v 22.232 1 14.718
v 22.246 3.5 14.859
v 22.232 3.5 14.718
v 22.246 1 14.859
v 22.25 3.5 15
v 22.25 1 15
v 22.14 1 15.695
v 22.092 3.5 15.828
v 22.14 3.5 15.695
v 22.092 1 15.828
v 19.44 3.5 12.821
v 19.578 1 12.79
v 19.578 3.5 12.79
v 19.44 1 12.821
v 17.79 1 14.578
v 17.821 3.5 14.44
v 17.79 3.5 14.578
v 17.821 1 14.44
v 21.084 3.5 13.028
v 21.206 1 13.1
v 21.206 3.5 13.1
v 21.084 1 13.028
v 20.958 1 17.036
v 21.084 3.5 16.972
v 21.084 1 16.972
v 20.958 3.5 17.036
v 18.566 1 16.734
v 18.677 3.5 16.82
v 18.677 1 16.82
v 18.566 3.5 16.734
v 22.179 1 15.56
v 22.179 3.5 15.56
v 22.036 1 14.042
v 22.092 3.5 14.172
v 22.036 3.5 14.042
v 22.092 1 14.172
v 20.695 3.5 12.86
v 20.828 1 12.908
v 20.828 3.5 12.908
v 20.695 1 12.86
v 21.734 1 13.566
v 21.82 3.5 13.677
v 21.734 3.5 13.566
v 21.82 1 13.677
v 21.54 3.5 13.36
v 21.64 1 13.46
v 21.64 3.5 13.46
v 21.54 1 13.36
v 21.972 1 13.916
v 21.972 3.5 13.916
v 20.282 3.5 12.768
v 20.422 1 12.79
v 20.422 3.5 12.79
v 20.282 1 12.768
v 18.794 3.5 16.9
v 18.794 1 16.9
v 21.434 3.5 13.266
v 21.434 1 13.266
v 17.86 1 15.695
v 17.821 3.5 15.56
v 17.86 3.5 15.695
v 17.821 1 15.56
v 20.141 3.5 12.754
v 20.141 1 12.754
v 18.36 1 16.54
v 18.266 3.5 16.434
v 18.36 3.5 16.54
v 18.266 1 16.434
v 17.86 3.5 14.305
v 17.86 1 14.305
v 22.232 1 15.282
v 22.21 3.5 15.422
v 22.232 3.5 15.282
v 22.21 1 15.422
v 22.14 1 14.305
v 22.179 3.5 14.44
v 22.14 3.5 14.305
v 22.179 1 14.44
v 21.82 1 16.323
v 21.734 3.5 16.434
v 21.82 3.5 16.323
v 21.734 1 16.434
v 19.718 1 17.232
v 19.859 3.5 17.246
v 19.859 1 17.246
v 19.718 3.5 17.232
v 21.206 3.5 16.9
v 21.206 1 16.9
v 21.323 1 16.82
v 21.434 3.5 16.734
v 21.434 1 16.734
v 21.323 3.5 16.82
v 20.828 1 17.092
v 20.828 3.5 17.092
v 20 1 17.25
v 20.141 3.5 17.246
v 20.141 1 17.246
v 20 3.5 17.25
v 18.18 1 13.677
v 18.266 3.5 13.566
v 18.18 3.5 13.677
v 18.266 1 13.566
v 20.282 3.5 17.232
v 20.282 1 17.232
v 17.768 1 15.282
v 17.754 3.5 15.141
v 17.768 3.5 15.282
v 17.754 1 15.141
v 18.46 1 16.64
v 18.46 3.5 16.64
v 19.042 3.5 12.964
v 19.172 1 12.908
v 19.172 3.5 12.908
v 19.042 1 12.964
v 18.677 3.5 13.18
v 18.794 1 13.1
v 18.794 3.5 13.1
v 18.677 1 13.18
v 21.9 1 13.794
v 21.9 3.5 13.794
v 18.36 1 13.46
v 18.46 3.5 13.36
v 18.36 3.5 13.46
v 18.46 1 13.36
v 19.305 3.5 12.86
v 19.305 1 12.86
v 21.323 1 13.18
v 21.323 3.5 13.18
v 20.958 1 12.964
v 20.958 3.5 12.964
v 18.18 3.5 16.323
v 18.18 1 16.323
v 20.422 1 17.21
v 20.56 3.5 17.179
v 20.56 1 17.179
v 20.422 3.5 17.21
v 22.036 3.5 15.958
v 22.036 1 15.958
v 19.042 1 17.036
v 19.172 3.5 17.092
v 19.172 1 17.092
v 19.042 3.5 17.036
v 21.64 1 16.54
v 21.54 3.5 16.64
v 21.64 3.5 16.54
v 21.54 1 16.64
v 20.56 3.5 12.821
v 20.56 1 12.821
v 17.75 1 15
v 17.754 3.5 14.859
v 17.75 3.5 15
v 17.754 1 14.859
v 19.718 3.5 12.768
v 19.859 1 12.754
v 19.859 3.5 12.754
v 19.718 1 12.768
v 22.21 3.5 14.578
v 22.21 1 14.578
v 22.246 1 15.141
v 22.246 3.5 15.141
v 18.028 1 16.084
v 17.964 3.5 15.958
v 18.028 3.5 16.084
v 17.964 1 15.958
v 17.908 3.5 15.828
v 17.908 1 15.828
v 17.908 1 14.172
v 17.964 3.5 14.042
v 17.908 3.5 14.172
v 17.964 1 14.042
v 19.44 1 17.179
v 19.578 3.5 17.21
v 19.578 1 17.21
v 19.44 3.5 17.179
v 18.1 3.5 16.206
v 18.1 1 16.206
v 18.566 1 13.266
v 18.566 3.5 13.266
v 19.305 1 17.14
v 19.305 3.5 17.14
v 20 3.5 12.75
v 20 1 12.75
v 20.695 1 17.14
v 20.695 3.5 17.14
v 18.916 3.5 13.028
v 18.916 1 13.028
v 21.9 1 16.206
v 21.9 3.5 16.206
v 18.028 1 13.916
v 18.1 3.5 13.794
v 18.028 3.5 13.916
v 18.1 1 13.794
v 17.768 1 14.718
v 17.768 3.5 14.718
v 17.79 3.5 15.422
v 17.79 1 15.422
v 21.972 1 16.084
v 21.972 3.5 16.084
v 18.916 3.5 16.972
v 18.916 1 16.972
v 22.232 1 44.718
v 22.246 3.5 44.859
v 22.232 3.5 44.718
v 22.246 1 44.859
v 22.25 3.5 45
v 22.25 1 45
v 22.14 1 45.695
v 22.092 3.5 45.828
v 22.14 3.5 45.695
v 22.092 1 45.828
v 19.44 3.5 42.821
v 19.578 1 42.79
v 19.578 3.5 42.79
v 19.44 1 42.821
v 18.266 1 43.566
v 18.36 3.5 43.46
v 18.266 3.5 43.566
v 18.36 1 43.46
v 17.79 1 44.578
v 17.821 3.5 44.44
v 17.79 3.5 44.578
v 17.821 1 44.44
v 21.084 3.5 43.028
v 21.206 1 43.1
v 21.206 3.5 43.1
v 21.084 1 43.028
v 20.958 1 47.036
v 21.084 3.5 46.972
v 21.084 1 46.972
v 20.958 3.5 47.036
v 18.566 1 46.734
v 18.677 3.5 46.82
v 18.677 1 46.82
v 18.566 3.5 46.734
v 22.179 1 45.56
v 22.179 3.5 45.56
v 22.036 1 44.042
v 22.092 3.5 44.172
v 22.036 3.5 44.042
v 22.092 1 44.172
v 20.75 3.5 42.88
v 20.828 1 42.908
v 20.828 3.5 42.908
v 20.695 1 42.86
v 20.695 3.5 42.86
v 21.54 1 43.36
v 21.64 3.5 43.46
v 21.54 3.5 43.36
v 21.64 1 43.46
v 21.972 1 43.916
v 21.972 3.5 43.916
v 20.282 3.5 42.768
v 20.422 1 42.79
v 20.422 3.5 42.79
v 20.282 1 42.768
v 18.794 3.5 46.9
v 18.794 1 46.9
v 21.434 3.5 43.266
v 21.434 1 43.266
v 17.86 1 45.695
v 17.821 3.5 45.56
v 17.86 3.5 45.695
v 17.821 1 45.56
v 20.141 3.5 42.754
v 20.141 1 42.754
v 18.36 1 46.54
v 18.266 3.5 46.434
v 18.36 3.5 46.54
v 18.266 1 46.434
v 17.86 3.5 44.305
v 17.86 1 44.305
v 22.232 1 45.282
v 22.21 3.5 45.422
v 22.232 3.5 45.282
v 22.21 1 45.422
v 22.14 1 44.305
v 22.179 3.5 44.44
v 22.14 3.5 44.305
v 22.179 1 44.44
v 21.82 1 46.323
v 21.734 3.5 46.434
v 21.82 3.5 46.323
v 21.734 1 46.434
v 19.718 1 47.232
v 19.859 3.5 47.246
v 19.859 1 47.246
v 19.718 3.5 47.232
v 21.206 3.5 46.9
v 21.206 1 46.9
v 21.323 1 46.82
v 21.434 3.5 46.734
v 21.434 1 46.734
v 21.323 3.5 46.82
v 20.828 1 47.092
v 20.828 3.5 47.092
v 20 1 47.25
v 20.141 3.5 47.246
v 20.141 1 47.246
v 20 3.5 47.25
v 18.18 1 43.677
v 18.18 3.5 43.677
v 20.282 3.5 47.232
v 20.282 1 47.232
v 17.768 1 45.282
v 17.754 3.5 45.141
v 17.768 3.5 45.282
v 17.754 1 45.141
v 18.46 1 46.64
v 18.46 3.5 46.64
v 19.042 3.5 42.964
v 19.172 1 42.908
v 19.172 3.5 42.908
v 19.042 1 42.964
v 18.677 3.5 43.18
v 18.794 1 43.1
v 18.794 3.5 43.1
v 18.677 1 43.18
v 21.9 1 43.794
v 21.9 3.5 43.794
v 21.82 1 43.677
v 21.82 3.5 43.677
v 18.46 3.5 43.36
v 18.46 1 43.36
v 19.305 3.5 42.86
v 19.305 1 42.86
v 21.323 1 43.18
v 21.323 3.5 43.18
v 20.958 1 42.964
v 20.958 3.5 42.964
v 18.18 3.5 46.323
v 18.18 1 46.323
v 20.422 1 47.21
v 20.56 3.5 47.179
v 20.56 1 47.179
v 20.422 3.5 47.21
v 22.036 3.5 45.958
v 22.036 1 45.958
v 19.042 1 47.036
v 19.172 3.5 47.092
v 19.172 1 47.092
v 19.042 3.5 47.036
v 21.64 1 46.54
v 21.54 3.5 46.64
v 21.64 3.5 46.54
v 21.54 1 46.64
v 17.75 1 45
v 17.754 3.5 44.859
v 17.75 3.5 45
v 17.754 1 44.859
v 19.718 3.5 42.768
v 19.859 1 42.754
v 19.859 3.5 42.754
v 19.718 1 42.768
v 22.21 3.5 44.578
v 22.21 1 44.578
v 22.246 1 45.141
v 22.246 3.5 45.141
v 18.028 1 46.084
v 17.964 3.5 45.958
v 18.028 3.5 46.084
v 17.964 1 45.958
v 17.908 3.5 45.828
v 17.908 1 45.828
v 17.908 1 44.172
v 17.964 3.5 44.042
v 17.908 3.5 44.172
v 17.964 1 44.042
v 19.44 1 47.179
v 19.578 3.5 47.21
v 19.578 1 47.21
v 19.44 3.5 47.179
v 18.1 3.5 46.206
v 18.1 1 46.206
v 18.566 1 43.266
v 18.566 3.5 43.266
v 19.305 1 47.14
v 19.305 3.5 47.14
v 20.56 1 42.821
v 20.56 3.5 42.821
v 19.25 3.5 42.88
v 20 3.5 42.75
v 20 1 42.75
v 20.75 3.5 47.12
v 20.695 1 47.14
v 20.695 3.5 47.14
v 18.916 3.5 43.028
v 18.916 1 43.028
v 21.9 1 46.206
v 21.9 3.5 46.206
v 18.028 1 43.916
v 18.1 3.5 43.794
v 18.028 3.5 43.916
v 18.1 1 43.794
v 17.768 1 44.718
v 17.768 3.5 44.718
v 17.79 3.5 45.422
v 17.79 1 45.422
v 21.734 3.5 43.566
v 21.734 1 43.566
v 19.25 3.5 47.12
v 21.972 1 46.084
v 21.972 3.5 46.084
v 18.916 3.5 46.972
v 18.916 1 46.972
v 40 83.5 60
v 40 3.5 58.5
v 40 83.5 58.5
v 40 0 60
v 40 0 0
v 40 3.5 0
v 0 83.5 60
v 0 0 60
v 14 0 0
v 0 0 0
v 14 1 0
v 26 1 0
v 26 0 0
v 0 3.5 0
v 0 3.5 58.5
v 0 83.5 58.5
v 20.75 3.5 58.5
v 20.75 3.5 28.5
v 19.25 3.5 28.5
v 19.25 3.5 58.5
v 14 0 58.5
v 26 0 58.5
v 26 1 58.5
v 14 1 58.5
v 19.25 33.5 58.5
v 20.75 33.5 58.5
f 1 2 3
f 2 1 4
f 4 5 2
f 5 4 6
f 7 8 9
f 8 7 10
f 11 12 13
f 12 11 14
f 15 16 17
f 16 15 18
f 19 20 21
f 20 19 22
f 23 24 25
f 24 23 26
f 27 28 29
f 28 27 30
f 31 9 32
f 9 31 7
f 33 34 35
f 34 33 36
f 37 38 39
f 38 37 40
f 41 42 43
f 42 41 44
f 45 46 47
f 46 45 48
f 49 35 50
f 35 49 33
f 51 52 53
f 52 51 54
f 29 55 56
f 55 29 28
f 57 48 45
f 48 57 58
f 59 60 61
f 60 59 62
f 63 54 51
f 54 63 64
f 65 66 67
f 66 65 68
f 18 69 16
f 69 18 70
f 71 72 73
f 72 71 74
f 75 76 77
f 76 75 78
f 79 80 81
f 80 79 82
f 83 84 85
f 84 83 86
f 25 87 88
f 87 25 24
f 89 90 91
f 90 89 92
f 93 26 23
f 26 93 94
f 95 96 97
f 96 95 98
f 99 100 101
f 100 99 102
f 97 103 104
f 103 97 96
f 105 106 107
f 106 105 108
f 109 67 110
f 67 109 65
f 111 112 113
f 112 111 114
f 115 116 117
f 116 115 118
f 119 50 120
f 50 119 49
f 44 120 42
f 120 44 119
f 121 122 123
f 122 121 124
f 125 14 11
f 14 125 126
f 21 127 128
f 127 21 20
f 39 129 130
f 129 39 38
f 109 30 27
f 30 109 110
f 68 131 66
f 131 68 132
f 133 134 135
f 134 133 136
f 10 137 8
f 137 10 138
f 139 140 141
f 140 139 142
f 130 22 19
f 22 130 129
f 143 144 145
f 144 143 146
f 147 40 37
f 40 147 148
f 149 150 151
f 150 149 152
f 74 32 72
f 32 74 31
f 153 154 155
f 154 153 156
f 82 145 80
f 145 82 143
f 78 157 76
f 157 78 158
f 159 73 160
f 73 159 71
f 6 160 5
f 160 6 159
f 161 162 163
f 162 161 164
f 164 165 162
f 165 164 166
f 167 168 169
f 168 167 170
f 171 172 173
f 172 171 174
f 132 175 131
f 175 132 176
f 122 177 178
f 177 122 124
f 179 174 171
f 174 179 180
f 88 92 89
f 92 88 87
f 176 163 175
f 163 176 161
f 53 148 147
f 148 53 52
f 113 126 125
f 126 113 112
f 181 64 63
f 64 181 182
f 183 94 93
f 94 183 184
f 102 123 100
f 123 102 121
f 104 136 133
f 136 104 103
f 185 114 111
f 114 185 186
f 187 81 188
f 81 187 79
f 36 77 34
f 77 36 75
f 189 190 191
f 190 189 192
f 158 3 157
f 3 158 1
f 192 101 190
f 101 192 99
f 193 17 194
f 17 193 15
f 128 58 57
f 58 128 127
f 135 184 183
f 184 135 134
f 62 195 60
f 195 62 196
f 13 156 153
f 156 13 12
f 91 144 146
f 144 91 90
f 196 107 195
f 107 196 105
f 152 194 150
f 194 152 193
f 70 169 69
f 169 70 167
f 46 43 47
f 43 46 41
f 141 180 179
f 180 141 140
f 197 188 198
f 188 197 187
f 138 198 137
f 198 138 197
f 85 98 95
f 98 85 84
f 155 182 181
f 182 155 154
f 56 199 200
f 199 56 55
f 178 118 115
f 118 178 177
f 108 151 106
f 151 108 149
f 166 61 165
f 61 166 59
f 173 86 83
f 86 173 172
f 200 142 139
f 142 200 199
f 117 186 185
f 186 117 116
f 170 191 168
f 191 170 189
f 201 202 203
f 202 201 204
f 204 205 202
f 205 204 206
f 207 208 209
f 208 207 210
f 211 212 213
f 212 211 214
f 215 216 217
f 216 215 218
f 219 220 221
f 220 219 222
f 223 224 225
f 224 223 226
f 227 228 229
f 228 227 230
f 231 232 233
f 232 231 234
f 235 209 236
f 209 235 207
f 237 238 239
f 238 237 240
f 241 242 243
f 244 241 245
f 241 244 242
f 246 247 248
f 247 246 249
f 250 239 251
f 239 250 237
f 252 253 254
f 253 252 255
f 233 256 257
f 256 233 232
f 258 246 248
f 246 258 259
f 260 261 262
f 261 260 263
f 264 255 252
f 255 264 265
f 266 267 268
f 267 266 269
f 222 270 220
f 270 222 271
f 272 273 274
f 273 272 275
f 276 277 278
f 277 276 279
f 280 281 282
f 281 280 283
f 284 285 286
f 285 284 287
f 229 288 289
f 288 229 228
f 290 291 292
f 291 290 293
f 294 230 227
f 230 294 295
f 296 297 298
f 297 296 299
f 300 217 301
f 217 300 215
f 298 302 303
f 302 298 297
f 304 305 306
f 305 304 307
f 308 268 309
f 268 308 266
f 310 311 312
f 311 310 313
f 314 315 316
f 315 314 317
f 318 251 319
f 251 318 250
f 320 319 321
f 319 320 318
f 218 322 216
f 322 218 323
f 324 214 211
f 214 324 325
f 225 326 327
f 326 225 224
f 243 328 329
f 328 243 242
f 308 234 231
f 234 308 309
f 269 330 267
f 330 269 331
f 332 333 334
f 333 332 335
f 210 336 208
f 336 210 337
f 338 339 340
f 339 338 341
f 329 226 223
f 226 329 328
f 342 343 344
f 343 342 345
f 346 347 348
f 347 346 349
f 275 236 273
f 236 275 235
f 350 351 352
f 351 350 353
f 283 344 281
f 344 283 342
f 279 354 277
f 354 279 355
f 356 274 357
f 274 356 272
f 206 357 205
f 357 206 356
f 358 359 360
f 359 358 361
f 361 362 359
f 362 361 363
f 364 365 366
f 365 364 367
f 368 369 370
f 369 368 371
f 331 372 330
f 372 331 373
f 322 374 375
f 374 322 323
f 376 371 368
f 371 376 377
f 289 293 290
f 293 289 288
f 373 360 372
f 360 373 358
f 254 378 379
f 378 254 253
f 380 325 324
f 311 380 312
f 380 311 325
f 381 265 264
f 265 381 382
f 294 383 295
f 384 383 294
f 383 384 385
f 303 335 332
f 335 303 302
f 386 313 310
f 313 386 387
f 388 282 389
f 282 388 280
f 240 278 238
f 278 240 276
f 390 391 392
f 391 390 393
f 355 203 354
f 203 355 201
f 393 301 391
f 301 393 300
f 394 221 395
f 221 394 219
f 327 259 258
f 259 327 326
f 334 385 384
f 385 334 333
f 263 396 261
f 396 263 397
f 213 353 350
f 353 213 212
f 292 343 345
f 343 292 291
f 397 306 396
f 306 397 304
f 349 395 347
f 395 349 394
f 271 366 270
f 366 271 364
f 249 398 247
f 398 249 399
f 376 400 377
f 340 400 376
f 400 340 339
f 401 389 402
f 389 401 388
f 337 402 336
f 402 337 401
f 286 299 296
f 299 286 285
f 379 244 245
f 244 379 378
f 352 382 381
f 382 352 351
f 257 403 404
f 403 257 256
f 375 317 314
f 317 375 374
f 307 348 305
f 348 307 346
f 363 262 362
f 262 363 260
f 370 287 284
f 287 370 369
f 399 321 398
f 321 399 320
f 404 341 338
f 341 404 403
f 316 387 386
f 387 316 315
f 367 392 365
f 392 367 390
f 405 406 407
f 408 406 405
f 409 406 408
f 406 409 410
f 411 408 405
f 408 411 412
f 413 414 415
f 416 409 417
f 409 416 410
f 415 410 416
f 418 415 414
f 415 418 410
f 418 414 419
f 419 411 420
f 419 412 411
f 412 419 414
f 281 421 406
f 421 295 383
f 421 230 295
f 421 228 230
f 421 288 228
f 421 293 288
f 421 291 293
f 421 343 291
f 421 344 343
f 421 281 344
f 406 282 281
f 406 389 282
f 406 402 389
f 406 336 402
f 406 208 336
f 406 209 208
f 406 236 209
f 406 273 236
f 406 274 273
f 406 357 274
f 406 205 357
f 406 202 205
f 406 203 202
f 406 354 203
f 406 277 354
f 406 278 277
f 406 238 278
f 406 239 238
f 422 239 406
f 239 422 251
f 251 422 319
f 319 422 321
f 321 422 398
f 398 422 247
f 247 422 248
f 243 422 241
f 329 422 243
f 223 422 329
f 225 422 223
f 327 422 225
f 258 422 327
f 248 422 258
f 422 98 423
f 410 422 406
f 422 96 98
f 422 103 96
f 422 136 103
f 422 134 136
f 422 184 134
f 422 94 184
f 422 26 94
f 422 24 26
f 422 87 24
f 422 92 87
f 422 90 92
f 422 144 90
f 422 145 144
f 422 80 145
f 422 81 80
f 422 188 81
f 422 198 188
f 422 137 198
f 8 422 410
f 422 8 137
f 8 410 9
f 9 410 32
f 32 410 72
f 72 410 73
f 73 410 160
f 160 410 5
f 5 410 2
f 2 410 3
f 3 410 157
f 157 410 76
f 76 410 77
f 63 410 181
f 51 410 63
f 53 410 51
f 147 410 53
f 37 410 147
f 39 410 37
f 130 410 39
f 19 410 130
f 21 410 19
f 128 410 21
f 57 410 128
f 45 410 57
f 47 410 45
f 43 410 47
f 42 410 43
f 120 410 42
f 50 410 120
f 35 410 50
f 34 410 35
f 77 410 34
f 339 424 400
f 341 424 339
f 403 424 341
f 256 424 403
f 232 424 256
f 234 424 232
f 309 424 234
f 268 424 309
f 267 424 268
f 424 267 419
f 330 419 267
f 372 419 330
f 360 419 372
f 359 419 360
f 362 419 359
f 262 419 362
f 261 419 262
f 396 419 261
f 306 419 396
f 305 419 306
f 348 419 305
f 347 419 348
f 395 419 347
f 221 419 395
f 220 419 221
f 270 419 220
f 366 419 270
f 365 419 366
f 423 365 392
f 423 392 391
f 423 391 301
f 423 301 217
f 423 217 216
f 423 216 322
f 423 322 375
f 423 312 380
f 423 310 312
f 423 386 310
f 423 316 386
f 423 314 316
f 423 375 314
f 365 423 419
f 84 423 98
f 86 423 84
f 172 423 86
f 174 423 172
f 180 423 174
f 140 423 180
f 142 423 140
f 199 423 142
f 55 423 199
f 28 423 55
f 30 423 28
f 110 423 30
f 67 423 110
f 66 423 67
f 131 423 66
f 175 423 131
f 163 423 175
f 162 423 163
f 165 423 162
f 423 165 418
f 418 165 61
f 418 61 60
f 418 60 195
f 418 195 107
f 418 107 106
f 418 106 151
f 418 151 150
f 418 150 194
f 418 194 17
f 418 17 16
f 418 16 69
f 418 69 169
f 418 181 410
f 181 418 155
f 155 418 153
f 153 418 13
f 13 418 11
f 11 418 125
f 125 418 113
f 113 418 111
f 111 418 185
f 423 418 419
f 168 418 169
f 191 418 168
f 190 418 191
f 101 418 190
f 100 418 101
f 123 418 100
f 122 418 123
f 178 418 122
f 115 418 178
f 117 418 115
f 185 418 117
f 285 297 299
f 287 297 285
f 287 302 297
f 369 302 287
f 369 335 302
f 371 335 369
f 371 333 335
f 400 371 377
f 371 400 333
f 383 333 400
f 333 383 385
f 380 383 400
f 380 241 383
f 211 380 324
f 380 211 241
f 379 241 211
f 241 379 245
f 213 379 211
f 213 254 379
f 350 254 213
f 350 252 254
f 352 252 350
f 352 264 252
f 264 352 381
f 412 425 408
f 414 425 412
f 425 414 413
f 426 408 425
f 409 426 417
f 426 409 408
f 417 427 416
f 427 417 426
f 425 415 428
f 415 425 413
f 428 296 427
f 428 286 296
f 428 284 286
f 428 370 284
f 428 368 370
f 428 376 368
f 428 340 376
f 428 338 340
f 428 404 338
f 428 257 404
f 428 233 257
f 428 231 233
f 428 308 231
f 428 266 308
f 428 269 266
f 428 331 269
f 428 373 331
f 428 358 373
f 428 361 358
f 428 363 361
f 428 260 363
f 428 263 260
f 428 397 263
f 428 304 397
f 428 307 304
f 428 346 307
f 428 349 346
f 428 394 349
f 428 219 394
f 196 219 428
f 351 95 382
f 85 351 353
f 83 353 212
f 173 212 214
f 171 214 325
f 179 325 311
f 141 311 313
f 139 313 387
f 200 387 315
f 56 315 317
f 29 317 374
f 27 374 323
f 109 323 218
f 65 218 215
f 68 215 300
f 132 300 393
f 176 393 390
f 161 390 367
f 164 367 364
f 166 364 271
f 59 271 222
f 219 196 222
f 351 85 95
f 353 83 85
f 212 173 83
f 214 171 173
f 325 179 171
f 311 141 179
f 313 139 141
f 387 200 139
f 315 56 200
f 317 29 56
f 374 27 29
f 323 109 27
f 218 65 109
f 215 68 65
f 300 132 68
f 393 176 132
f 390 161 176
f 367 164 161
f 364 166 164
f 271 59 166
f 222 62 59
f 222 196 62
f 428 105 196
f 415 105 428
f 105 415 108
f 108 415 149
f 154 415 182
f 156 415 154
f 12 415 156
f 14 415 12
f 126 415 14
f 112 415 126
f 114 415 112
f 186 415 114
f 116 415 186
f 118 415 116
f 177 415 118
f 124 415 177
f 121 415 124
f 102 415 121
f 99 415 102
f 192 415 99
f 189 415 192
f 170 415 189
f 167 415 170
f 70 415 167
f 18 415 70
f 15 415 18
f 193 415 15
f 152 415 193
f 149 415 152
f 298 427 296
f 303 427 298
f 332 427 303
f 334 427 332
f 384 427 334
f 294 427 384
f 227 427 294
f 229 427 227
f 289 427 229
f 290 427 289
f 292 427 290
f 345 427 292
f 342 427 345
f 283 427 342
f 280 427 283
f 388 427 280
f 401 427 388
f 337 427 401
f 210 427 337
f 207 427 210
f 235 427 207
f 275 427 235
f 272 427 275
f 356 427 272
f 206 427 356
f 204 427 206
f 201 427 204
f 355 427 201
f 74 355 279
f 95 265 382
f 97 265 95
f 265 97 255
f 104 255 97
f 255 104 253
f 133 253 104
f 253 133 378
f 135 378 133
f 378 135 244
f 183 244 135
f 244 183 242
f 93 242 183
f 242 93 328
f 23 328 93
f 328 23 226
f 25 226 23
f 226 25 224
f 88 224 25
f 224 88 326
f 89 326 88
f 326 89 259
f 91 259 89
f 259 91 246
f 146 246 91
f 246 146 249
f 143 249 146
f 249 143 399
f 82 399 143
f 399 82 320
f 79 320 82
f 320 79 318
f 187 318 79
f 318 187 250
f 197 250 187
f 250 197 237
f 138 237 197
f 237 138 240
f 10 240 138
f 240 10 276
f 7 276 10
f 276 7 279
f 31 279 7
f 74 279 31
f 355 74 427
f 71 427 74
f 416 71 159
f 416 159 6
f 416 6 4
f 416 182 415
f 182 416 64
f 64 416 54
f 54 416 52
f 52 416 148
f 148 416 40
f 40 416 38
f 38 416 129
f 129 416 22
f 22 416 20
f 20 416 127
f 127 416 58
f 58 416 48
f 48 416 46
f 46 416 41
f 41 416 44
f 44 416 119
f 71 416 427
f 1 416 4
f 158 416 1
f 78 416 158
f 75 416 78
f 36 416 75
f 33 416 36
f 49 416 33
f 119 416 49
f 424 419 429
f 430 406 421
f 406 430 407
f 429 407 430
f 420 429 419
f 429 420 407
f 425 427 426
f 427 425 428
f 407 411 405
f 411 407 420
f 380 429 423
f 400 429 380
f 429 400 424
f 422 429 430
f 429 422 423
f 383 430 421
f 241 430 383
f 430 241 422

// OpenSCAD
// === DESCRIPTION ===
// Shelf Bracket: an L-shaped bracket that screws to a wall stud and holds up
// one end of a small shelf (books, plants, about 5 kg per bracket).
//
// Design decisions:
//   - Modelled the way it hangs on the wall so the preview matches the room.
//   - A triangular gusset stiffens the corner.
//
// Terminology -> code:
//   "wall plate"  -> plate_h, plate_w, wall
//   "shelf arm"   -> arm_len, wall
//   "screw holes" -> screw_d, screw_z1, screw_z2
//   "gusset"      -> gusset_len
//
// Common modifications:
//   Longer arm     -> arm_len
//   Bigger screws  -> screw_d
//
// Overall dimensions: 40 x 84 x 60 mm (fits the X1C 256 mm bed)
// Coordinate system: X = width, Y = out from the wall, Z = up the wall

// === PRINT SETTINGS ===
// Material: PETG
// Layer Height: 0.2mm
// Walls/Perimeters: 4
// Infill: 30% gyroid
// Supports: None required
// Orientation: As modelled, wall plate standing on the bed
// Notes: Dry PETG before printing

// === PARAMETERS ===
nozzle_diameter = 0.4;
layer_height = 0.2;

plate_w = 40;      // bracket width (X)
plate_h = 60;      // wall plate height (Z)
arm_len = 80;      // shelf arm reach from the wall (Y)
wall = 1.5;        // plate and arm thickness
screw_d = 4.5;     // wood screw clearance
screw_z1 = 15;     // lower screw height
screw_z2 = 45;     // upper screw height
gusset_len = 30;   // gusset leg length

// === DERIVED CONSTANTS ===
$fn = 100;

// === MODULES ===
module wall_plate() {
    difference() {
        cube([plate_w, wall + 2, plate_h]);
        // recess for the screw heads, flush with the bottom face
        translate([plate_w / 2 - 6, 0, 0]) cube([12, 1, plate_h]);
        for (z = [screw_z1, screw_z2])
            translate([plate_w / 2, -1, z]) rotate([-90, 0, 0]) cylinder(d = screw_d, h = wall + 4);
    }
}

module shelf_arm() {
    translate([0, 0, plate_h - wall]) cube([plate_w, arm_len + wall + 2, wall]);
}

module gusset() {
    translate([plate_w / 2 - wall / 2, wall + 2, plate_h - wall])
        rotate([0, 90, 0])
            linear_extrude(wall)
                polygon([[0, 0], [gusset_len, 0], [0, gusset_len]]);
}

// === ASSEMBLY / RENDER ===
wall_plate();
shelf_arm();
gusset();
